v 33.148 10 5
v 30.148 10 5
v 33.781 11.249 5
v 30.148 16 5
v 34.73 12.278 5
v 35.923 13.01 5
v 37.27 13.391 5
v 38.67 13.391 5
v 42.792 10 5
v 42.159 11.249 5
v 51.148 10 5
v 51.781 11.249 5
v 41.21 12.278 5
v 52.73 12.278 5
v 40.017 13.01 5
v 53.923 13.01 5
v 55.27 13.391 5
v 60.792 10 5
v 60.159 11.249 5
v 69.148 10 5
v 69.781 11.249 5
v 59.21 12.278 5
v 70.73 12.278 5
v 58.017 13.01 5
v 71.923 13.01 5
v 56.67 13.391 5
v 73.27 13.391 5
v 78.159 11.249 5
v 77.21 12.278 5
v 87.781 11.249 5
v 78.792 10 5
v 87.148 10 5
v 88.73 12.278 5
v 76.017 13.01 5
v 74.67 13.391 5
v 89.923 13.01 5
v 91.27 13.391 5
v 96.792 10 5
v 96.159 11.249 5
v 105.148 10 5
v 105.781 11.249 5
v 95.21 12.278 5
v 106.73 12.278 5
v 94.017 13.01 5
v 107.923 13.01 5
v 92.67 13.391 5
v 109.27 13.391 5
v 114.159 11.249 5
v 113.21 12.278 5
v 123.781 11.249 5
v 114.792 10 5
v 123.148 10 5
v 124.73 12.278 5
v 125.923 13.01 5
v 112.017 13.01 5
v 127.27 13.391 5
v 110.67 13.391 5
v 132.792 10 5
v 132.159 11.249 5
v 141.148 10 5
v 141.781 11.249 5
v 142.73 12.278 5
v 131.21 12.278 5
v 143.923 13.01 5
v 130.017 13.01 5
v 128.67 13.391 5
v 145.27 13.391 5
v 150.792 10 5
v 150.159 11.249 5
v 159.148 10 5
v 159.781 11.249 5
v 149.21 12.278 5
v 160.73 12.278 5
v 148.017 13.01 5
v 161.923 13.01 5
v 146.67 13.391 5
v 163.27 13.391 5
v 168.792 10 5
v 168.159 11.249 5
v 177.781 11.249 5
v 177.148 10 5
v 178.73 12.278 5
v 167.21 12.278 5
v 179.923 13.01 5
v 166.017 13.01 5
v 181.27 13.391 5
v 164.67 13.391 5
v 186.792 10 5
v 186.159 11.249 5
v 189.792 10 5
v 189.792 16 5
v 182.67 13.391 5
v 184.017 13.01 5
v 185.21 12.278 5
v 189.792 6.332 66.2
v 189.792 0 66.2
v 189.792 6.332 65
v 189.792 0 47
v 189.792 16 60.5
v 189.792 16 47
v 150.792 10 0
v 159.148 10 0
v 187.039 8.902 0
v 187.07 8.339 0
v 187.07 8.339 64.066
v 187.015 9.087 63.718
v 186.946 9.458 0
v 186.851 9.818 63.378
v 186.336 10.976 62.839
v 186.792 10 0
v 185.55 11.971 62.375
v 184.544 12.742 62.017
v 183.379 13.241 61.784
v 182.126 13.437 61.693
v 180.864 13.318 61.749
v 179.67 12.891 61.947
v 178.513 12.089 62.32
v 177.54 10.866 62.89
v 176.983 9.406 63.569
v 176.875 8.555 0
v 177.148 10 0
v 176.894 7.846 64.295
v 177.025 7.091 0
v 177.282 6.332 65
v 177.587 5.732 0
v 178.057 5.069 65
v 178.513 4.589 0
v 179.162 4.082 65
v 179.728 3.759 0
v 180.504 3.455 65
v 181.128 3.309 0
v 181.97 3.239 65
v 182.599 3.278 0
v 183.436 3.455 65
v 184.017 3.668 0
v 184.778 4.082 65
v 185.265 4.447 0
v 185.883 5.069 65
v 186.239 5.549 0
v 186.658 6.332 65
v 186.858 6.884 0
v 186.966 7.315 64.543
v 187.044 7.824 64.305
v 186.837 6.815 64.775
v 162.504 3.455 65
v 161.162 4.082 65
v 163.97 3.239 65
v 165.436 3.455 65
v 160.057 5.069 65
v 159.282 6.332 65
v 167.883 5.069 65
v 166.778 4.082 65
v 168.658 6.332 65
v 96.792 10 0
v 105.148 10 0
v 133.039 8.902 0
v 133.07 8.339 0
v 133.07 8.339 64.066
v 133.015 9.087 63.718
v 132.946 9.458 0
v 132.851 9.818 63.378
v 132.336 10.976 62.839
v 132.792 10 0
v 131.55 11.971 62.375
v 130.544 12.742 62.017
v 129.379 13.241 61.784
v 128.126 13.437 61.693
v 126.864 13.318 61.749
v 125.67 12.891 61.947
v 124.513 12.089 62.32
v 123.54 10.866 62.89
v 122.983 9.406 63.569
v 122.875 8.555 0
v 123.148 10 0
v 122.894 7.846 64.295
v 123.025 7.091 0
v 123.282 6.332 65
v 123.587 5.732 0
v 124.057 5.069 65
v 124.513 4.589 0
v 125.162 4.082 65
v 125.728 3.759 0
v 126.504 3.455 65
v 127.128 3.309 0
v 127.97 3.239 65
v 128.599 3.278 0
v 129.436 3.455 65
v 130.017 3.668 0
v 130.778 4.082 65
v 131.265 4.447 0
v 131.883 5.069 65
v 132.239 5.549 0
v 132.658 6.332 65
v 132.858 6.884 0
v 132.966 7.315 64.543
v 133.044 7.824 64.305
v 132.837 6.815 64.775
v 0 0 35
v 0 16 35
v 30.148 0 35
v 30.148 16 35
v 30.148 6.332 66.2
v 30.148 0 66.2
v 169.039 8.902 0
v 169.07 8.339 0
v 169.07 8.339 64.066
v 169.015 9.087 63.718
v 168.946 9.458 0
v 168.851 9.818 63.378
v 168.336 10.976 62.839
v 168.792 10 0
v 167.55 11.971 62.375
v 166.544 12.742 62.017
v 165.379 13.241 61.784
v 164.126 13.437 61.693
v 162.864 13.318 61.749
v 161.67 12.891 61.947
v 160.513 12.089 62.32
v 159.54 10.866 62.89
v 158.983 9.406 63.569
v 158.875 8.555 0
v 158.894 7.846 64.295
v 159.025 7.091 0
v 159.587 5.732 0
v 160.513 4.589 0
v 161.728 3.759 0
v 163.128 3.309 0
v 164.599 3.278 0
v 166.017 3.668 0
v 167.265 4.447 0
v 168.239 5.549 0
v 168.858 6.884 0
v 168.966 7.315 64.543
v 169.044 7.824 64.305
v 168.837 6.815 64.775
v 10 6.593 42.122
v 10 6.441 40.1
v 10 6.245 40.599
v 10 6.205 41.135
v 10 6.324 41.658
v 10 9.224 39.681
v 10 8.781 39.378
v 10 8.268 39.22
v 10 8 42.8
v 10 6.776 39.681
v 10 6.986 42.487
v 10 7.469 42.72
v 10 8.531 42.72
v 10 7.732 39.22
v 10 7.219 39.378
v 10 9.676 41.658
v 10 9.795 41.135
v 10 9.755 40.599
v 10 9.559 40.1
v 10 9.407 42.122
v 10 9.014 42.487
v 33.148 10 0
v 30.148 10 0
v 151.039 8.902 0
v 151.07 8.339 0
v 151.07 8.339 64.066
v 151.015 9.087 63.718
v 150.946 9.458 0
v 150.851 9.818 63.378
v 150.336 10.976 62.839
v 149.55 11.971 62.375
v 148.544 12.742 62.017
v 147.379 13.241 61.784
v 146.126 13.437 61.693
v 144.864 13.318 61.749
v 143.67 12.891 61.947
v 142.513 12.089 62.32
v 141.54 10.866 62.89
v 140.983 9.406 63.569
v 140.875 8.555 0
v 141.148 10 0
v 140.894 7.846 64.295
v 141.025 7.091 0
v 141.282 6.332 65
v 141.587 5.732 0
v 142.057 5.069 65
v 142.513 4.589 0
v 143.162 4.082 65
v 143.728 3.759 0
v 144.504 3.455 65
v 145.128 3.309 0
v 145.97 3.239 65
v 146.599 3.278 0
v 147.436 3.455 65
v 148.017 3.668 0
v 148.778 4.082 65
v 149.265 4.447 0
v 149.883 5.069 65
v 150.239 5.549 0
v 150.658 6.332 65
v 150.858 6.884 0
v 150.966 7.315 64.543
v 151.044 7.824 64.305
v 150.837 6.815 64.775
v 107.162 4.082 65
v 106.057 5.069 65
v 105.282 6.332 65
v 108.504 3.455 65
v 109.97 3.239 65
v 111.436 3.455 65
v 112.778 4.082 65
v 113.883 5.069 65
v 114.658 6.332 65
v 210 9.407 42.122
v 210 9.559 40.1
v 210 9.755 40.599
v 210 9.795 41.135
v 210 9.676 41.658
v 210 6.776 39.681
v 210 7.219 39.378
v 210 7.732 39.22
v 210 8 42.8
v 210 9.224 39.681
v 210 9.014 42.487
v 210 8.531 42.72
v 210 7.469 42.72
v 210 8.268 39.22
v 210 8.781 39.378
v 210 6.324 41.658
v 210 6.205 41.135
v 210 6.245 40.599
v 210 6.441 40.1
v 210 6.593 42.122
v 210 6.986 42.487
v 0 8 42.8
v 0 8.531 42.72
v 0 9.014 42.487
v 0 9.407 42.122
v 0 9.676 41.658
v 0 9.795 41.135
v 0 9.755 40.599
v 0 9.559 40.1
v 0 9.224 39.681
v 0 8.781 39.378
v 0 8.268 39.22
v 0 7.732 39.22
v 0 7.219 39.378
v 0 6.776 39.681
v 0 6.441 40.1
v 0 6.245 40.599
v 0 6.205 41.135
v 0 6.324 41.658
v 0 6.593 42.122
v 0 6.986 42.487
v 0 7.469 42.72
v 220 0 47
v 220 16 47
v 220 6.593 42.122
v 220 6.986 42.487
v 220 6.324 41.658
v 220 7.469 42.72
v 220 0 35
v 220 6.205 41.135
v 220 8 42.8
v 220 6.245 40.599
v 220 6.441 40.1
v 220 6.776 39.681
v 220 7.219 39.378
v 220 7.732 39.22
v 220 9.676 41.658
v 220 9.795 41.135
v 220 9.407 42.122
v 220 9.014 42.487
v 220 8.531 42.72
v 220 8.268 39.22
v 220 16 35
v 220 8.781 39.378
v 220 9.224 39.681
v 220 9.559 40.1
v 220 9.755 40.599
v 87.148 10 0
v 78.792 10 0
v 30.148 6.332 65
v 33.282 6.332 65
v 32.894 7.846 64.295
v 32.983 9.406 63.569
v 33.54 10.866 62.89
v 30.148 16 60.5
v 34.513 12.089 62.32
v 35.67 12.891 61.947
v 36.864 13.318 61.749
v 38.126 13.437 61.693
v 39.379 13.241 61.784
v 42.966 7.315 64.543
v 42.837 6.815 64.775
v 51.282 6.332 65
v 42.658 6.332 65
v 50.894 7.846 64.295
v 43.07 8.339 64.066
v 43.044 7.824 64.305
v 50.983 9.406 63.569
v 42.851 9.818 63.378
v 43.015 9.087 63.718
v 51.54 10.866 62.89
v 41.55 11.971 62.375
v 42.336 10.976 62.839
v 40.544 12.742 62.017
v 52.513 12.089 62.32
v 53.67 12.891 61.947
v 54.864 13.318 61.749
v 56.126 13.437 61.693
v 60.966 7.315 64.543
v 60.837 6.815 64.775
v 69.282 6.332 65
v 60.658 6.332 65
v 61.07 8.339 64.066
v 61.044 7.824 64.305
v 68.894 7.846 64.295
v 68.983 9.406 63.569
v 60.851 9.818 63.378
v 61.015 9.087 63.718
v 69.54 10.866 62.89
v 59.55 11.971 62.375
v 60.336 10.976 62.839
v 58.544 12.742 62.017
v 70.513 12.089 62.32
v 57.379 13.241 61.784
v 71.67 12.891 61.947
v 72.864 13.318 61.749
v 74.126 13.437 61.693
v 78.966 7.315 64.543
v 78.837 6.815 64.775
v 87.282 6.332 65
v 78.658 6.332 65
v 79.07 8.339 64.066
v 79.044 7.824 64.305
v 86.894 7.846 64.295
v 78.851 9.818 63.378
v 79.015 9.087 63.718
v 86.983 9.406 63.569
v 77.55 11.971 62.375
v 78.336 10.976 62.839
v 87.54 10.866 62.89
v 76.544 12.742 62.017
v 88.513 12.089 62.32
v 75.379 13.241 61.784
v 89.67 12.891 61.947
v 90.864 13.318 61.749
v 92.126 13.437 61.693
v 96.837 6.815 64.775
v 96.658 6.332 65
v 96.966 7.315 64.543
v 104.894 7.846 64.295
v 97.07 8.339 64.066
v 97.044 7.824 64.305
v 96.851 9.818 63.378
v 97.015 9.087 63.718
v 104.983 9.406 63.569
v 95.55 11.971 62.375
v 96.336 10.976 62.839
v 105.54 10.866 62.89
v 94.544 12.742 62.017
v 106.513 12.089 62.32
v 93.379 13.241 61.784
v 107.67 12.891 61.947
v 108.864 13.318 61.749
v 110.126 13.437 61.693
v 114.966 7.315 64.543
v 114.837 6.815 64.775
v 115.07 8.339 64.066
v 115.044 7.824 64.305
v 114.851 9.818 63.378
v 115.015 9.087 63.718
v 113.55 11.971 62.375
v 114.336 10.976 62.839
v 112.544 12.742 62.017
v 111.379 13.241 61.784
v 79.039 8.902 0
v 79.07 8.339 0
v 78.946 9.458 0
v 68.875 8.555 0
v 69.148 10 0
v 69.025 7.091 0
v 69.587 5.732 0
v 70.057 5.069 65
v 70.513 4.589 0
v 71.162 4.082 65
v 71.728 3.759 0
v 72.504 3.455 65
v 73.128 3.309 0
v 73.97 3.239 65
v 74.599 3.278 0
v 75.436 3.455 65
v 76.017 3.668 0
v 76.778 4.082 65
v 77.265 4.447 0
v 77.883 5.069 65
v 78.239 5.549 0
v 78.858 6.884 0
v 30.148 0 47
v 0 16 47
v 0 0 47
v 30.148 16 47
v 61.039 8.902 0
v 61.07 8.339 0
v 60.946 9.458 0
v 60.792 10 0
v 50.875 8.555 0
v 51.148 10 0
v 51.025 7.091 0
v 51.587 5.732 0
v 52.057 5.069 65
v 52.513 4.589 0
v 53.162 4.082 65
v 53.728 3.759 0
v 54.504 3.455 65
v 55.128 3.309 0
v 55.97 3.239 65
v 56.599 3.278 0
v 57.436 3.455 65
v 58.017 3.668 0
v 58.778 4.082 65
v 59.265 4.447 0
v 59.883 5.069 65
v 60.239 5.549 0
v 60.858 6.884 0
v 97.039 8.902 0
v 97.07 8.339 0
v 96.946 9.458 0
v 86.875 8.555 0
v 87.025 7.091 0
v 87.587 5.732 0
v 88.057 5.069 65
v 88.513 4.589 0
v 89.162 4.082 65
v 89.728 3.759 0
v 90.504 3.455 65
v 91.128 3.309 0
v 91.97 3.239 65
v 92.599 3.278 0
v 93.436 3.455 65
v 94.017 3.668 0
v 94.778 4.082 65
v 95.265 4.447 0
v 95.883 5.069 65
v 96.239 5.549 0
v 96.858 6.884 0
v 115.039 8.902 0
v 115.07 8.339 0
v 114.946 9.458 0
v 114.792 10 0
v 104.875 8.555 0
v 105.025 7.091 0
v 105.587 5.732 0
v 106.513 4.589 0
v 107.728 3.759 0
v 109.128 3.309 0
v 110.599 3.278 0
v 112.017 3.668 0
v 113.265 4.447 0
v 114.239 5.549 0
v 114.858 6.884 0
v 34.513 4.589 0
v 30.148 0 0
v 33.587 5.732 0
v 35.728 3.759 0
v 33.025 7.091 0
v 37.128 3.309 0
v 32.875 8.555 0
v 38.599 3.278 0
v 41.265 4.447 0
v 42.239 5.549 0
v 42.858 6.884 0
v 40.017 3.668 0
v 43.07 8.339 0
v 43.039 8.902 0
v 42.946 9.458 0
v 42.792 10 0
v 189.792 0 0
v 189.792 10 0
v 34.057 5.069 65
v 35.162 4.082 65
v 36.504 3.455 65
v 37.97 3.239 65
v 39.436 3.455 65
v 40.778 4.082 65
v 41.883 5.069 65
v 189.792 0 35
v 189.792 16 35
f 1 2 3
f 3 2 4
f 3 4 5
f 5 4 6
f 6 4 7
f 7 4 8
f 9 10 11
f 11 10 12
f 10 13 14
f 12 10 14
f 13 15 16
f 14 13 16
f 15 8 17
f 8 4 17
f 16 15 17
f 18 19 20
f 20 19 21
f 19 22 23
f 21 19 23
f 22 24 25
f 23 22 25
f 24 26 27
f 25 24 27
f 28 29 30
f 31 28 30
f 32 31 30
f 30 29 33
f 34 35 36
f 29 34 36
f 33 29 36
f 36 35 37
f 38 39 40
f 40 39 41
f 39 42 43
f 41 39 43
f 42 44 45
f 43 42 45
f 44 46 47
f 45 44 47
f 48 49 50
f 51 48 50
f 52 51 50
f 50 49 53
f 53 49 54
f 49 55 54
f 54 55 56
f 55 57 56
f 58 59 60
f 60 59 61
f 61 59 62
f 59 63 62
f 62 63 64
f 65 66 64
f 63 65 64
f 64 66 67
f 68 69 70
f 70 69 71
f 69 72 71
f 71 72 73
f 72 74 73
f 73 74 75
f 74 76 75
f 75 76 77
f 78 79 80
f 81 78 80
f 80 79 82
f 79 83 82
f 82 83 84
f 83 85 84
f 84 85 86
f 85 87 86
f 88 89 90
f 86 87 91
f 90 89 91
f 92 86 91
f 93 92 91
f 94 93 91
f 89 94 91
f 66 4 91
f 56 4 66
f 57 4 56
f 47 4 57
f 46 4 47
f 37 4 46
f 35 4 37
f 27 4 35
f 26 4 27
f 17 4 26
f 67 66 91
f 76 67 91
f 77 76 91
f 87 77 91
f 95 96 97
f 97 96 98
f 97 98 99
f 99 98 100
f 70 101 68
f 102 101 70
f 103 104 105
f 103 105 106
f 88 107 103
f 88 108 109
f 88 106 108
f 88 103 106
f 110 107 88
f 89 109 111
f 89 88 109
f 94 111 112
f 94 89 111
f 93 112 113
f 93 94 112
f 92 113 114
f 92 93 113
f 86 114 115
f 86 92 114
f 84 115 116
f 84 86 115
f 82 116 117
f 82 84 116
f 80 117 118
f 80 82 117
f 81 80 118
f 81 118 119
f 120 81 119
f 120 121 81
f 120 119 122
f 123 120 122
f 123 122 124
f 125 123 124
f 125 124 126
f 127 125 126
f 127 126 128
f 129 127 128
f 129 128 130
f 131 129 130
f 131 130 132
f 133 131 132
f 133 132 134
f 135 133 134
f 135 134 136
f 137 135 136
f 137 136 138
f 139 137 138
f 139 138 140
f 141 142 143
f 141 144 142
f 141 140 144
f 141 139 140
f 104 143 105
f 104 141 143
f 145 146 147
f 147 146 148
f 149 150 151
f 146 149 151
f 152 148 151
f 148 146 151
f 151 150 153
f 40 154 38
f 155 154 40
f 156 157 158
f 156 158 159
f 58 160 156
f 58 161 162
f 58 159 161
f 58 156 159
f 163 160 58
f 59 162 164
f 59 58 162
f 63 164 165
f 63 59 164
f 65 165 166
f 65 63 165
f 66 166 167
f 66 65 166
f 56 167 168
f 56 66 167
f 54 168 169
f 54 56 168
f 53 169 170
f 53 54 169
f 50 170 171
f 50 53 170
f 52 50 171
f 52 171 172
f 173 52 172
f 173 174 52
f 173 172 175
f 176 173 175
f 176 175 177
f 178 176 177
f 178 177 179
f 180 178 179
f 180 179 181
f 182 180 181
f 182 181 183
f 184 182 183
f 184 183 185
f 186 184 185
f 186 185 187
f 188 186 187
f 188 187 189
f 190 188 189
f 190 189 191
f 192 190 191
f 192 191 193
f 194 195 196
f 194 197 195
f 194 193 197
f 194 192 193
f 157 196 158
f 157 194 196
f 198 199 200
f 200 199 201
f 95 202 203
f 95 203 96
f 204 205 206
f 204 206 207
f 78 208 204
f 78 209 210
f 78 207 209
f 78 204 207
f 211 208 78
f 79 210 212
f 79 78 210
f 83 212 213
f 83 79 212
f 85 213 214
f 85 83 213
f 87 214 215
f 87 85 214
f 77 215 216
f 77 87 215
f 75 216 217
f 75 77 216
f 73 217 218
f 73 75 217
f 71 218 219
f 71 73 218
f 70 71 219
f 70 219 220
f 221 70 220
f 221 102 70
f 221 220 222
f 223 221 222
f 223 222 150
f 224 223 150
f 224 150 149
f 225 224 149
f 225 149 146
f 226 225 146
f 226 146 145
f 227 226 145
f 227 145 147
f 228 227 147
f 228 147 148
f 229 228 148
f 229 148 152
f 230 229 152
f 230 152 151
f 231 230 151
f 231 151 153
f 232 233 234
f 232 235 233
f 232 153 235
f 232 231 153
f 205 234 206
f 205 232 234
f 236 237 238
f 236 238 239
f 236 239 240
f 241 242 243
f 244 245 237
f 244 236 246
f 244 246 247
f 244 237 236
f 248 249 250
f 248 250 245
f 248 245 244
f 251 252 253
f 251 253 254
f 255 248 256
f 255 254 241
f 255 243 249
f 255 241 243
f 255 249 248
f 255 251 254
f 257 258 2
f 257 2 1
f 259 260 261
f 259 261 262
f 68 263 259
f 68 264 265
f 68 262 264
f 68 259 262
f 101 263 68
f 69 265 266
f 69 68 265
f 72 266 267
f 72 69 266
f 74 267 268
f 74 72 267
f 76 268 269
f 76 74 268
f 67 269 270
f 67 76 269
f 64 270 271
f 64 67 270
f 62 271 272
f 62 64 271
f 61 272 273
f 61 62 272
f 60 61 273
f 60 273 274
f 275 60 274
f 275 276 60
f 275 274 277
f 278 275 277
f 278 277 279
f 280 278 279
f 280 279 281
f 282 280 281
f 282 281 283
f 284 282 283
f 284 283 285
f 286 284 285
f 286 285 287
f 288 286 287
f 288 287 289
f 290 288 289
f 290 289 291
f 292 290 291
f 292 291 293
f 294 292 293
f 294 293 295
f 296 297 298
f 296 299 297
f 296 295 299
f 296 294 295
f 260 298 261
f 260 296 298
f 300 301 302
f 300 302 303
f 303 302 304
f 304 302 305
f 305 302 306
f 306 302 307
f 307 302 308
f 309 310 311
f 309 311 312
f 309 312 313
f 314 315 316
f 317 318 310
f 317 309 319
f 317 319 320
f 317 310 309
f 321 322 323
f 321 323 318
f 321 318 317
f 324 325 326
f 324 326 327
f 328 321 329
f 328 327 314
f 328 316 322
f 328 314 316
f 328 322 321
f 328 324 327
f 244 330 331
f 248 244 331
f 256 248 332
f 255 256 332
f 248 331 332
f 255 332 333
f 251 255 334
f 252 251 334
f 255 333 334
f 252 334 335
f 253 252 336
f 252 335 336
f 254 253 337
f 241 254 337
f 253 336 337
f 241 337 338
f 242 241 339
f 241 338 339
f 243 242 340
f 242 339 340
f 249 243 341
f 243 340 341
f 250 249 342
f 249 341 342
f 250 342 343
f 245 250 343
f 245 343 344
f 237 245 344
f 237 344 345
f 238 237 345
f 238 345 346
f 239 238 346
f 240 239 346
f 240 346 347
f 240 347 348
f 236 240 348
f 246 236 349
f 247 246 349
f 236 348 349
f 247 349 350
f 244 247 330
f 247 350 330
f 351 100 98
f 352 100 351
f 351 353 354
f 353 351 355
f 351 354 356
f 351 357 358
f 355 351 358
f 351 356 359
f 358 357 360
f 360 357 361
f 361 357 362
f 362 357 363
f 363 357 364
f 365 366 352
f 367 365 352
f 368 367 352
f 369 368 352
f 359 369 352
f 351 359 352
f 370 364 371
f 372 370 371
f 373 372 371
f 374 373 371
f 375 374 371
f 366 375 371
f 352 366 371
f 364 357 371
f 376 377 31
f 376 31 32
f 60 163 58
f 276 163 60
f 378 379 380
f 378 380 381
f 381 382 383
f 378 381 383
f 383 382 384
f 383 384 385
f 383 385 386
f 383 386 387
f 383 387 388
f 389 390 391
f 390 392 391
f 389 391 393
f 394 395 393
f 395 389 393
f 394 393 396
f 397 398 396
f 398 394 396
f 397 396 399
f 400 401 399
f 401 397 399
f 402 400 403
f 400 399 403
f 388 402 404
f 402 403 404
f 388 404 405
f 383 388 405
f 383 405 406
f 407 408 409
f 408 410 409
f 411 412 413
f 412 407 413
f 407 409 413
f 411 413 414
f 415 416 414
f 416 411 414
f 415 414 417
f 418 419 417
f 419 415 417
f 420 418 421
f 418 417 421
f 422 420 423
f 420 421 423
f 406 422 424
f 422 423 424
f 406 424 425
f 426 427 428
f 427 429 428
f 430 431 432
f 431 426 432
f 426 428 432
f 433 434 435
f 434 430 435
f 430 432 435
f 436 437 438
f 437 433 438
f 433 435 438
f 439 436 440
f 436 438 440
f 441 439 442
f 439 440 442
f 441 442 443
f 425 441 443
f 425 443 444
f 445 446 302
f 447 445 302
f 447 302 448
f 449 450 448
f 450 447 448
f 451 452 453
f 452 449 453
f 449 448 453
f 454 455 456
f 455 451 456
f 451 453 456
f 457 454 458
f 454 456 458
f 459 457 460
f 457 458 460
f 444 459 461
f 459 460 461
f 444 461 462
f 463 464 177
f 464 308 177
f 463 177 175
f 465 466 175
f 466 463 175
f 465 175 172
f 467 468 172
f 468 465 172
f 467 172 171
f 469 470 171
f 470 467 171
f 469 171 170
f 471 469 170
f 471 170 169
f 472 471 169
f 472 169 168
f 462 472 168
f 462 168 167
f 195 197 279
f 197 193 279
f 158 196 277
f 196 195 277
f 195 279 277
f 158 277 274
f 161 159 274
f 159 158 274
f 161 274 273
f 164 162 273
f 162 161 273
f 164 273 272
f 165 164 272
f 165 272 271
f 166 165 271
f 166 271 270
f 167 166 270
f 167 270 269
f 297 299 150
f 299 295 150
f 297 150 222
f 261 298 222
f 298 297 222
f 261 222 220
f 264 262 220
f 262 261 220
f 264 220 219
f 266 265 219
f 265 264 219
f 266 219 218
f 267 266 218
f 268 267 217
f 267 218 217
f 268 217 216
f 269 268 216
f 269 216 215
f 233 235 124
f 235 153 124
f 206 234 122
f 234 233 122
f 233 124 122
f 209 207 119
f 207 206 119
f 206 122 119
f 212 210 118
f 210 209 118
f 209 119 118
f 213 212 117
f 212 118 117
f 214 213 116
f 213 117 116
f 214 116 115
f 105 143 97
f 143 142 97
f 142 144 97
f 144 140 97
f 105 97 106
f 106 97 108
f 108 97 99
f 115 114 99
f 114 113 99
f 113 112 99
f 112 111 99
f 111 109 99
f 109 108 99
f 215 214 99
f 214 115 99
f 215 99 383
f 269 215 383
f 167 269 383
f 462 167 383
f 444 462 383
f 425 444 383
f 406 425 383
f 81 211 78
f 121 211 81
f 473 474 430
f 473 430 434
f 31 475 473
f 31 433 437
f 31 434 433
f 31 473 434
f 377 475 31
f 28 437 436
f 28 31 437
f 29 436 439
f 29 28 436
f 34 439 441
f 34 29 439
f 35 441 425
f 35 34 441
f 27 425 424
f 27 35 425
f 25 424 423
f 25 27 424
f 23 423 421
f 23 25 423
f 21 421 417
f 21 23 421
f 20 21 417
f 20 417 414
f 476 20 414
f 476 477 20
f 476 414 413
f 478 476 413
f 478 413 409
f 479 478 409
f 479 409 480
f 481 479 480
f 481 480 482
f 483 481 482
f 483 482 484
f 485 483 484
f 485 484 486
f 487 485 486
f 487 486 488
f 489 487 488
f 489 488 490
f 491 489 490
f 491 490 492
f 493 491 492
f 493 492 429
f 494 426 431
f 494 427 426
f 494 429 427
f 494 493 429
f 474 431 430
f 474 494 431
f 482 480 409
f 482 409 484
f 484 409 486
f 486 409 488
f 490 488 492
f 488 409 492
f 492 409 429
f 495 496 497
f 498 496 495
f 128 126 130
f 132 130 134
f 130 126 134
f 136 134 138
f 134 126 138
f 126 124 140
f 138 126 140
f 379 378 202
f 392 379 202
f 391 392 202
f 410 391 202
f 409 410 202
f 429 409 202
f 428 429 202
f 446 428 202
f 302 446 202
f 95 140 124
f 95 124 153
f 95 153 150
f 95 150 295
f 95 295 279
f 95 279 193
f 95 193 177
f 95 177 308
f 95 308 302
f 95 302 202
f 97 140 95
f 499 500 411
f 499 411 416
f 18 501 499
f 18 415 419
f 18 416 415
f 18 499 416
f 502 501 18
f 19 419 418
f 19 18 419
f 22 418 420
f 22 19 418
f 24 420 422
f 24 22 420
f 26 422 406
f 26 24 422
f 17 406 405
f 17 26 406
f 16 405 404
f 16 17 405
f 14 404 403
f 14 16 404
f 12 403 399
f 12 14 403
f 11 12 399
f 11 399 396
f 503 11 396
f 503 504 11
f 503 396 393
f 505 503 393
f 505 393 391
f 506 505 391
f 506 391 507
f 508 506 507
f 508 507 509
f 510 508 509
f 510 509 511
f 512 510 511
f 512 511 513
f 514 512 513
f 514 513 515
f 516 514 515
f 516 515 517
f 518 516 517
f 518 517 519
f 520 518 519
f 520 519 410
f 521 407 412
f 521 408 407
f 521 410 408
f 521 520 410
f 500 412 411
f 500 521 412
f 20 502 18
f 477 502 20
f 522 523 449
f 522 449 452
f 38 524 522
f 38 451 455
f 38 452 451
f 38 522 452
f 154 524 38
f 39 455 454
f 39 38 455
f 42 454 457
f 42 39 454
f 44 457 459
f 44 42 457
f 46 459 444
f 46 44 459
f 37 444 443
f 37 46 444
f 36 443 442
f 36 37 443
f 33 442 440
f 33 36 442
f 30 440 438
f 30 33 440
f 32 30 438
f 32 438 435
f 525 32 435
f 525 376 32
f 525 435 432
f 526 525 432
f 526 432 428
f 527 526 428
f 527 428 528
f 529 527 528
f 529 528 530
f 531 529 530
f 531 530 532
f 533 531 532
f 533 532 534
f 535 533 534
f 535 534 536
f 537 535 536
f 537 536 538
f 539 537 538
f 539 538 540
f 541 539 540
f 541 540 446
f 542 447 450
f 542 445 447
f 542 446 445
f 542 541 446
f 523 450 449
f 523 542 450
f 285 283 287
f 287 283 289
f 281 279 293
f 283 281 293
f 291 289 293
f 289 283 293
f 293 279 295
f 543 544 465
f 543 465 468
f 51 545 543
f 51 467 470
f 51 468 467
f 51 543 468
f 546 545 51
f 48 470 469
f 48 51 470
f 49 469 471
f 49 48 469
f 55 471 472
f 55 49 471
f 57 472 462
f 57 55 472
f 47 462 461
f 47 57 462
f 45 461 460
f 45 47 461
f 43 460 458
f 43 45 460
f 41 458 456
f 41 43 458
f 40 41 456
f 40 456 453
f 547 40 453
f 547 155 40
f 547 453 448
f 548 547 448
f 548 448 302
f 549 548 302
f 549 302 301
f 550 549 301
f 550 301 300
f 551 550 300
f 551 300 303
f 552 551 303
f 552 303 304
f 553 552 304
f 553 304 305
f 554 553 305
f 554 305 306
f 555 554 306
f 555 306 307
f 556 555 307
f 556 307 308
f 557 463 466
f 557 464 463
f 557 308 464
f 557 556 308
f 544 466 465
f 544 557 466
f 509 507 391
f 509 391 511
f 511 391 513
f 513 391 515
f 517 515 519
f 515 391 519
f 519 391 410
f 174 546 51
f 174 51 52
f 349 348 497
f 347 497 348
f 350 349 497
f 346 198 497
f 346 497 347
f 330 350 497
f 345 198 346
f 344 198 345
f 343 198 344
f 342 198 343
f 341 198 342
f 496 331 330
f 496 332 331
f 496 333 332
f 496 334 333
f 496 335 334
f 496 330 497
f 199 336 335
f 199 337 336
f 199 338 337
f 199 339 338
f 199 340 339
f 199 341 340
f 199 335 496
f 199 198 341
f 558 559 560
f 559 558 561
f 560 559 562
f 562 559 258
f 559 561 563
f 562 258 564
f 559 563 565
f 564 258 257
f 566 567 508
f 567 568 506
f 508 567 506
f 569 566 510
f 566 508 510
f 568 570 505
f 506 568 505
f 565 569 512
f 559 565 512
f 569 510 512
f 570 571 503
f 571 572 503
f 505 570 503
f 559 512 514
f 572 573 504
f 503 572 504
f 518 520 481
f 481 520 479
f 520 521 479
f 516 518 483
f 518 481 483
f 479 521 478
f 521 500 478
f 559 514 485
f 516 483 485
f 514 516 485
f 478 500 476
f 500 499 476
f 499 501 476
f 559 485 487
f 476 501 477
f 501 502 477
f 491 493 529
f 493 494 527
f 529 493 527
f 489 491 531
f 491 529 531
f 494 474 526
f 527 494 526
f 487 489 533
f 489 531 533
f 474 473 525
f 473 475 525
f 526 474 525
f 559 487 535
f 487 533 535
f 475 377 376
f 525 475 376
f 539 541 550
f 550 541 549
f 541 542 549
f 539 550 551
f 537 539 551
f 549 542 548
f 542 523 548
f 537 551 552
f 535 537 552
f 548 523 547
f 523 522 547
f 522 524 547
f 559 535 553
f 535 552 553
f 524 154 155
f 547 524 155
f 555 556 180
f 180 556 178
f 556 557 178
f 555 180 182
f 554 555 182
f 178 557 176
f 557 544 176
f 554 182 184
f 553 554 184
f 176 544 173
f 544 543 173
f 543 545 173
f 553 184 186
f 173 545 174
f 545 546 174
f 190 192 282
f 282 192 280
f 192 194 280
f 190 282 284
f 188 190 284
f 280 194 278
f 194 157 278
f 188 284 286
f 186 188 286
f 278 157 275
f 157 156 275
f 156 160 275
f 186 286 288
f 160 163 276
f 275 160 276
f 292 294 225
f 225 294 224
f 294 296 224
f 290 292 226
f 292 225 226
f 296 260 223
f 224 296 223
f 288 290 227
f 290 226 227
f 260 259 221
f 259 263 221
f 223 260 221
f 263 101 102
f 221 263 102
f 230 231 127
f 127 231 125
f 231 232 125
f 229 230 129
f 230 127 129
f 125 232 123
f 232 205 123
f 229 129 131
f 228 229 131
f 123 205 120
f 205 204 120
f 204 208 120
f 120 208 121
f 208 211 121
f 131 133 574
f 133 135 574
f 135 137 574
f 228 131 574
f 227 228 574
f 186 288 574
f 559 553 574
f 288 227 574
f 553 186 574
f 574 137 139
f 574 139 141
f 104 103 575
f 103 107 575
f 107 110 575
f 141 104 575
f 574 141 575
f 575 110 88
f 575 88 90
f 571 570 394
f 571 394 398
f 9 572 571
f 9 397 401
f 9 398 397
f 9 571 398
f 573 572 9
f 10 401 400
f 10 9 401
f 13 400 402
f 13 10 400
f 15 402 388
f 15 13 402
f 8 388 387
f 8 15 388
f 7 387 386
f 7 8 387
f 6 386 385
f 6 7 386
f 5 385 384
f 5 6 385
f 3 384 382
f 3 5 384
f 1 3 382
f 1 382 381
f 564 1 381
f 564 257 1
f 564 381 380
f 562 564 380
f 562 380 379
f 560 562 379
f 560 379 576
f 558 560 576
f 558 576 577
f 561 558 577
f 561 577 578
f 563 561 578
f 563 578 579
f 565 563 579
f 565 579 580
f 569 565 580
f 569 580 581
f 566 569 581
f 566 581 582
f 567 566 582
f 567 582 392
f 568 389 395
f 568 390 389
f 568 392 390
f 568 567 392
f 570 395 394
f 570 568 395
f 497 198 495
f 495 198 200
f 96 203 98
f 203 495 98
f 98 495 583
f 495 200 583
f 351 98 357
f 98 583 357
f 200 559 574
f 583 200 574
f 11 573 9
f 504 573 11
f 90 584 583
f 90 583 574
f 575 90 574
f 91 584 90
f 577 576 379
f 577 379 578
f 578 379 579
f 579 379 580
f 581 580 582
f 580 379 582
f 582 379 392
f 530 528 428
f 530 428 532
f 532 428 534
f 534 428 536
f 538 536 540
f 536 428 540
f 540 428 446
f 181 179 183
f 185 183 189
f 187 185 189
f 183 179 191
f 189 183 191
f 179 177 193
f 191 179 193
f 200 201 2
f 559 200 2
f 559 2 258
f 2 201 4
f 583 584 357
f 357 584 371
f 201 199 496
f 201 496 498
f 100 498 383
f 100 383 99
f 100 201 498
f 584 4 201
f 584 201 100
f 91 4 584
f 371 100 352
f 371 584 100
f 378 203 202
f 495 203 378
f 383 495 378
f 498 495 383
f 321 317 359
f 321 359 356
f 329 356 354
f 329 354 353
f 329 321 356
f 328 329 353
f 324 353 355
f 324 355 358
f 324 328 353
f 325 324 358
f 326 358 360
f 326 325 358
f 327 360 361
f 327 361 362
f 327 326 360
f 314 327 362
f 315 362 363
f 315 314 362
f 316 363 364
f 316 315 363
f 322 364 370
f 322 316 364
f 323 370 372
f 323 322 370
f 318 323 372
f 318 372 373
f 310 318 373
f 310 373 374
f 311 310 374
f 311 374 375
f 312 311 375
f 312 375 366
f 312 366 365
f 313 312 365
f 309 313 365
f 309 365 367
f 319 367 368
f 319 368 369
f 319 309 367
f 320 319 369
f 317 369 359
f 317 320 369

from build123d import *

# Parameters (mm, degrees)
SKETCH_1_W          = 220
SKETCH_1_H          = 16
SKETCH_1_R          = 5.1
EXTRUDE_1_DEPTH     = 65
SKETCH_2_W          = 220
SKETCH_2_H          = 5
CUT_EXTRUDE_1_DEPTH = 6
SKETCH_3_W          = 30.147927972
SKETCH_3_H          = 35
SKETCH_3_H_2        = 18
SKETCH_3_W_2        = 30.207927972
CUT_EXTRUDE_2_DEPTH = 230.958691943
SKETCH_4_R          = 1.8
CUT_EXTRUDE_3_DEPTH = 10
CUT_EXTRUDE_START   = -10
SKETCH_5_R          = 1.8
CUT_EXTRUDE_4_DEPTH = 10
CUT_EXTRUDE_7_DEPTH = 202.251162989
SKETCH_9_W          = 159.644144056
SKETCH_9_H          = 6.33180748
EXTRUDE_2_DEPTH     = 1.2


with BuildPart() as part:
    # Эскиз1 → Бобышка-Вытянуть1 (new body)
    with BuildSketch(Plane.XY):
        with Locations((110, 8)):
            Rectangle(SKETCH_1_W, SKETCH_1_H)
        with Locations((37.97, 8.339391268)):
            Circle(SKETCH_1_R, mode=Mode.SUBTRACT)
        with Locations((55.97, 8.339391268)):
            Circle(SKETCH_1_R, mode=Mode.SUBTRACT)
        with Locations((73.97, 8.339391268)):
            Circle(SKETCH_1_R, mode=Mode.SUBTRACT)
        with Locations((91.97, 8.339391268)):
            Circle(SKETCH_1_R, mode=Mode.SUBTRACT)
        with Locations((109.97, 8.339391268)):
            Circle(SKETCH_1_R, mode=Mode.SUBTRACT)
        with Locations((127.97, 8.339391268)):
            Circle(SKETCH_1_R, mode=Mode.SUBTRACT)
        with Locations((145.97, 8.339391268)):
            Circle(SKETCH_1_R, mode=Mode.SUBTRACT)
        with Locations((163.97, 8.339391268)):
            Circle(SKETCH_1_R, mode=Mode.SUBTRACT)
        with Locations((181.97, 8.339391268)):
            Circle(SKETCH_1_R, mode=Mode.SUBTRACT)
    extrude(amount=EXTRUDE_1_DEPTH)

    # Эскиз2 → Вырез-Вытянуть1 (cut)
    with BuildSketch(Plane(origin=(0, 16, 0), x_dir=(1, 0, 0), z_dir=(0, 1, 0))):
        with Locations((110, -2.5)):
            Rectangle(SKETCH_2_W, SKETCH_2_H)
    extrude(amount=-CUT_EXTRUDE_1_DEPTH, mode=Mode.SUBTRACT)

    # Эскиз3 → Вырез-Вытянуть2 (cut, through all)
    with BuildSketch(Plane(origin=(0, 16, 0), x_dir=(1, 0, 0), z_dir=(0, 1, 0))):
        with Locations((15.073963986, -17.5)):
            Rectangle(SKETCH_3_W, SKETCH_3_H)
        with Locations((15.073963986, -56)):
            Rectangle(SKETCH_3_W, SKETCH_3_H_2)
        with Locations((204.896036014, -17.5)):
            Rectangle(SKETCH_3_W_2, SKETCH_3_H)
        with Locations((204.896036014, -56)):
            Rectangle(SKETCH_3_W_2, SKETCH_3_H_2)
    extrude(amount=-CUT_EXTRUDE_2_DEPTH, mode=Mode.SUBTRACT)

    # Эскиз4 → Вырез-Вытянуть3 (cut)
    with BuildSketch(Plane.ZY):
        with Locations((41, 8)):
            Circle(SKETCH_4_R)
    extrude(amount=-CUT_EXTRUDE_3_DEPTH, mode=Mode.SUBTRACT)

    # Эскиз5 → Вырез-Вытянуть4 (cut)
    with BuildSketch(Plane(origin=(220, 0, 0), x_dir=(0, 0, -1), z_dir=(1, 0, 0)).offset(CUT_EXTRUDE_START)):
        with Locations(Location((-41, 8, 0), (0, 0, 180))):
            Circle(SKETCH_5_R)
    extrude(amount=CUT_EXTRUDE_4_DEPTH, mode=Mode.SUBTRACT)

    # Эскиз8 → Вырез-Вытянуть7 (cut, through all)
    with BuildSketch(Plane(origin=(189.792072028, 0, 0), x_dir=(0, 0, -1), z_dir=(1, 0, 0))):
        Polygon((-65, 6.33180748), (-60.500350176, 16), (-65, 16), align=None)
    extrude(amount=-CUT_EXTRUDE_7_DEPTH, mode=Mode.SUBTRACT)

    # Эскиз9 → Бобышка-Вытянуть2 (add)
    with BuildSketch(Plane.XY.offset(65)):
        with Locations((109.97, 3.16590374)):
            Rectangle(SKETCH_9_W, SKETCH_9_H)
    extrude(amount=EXTRUDE_2_DEPTH)


solid = part.part
